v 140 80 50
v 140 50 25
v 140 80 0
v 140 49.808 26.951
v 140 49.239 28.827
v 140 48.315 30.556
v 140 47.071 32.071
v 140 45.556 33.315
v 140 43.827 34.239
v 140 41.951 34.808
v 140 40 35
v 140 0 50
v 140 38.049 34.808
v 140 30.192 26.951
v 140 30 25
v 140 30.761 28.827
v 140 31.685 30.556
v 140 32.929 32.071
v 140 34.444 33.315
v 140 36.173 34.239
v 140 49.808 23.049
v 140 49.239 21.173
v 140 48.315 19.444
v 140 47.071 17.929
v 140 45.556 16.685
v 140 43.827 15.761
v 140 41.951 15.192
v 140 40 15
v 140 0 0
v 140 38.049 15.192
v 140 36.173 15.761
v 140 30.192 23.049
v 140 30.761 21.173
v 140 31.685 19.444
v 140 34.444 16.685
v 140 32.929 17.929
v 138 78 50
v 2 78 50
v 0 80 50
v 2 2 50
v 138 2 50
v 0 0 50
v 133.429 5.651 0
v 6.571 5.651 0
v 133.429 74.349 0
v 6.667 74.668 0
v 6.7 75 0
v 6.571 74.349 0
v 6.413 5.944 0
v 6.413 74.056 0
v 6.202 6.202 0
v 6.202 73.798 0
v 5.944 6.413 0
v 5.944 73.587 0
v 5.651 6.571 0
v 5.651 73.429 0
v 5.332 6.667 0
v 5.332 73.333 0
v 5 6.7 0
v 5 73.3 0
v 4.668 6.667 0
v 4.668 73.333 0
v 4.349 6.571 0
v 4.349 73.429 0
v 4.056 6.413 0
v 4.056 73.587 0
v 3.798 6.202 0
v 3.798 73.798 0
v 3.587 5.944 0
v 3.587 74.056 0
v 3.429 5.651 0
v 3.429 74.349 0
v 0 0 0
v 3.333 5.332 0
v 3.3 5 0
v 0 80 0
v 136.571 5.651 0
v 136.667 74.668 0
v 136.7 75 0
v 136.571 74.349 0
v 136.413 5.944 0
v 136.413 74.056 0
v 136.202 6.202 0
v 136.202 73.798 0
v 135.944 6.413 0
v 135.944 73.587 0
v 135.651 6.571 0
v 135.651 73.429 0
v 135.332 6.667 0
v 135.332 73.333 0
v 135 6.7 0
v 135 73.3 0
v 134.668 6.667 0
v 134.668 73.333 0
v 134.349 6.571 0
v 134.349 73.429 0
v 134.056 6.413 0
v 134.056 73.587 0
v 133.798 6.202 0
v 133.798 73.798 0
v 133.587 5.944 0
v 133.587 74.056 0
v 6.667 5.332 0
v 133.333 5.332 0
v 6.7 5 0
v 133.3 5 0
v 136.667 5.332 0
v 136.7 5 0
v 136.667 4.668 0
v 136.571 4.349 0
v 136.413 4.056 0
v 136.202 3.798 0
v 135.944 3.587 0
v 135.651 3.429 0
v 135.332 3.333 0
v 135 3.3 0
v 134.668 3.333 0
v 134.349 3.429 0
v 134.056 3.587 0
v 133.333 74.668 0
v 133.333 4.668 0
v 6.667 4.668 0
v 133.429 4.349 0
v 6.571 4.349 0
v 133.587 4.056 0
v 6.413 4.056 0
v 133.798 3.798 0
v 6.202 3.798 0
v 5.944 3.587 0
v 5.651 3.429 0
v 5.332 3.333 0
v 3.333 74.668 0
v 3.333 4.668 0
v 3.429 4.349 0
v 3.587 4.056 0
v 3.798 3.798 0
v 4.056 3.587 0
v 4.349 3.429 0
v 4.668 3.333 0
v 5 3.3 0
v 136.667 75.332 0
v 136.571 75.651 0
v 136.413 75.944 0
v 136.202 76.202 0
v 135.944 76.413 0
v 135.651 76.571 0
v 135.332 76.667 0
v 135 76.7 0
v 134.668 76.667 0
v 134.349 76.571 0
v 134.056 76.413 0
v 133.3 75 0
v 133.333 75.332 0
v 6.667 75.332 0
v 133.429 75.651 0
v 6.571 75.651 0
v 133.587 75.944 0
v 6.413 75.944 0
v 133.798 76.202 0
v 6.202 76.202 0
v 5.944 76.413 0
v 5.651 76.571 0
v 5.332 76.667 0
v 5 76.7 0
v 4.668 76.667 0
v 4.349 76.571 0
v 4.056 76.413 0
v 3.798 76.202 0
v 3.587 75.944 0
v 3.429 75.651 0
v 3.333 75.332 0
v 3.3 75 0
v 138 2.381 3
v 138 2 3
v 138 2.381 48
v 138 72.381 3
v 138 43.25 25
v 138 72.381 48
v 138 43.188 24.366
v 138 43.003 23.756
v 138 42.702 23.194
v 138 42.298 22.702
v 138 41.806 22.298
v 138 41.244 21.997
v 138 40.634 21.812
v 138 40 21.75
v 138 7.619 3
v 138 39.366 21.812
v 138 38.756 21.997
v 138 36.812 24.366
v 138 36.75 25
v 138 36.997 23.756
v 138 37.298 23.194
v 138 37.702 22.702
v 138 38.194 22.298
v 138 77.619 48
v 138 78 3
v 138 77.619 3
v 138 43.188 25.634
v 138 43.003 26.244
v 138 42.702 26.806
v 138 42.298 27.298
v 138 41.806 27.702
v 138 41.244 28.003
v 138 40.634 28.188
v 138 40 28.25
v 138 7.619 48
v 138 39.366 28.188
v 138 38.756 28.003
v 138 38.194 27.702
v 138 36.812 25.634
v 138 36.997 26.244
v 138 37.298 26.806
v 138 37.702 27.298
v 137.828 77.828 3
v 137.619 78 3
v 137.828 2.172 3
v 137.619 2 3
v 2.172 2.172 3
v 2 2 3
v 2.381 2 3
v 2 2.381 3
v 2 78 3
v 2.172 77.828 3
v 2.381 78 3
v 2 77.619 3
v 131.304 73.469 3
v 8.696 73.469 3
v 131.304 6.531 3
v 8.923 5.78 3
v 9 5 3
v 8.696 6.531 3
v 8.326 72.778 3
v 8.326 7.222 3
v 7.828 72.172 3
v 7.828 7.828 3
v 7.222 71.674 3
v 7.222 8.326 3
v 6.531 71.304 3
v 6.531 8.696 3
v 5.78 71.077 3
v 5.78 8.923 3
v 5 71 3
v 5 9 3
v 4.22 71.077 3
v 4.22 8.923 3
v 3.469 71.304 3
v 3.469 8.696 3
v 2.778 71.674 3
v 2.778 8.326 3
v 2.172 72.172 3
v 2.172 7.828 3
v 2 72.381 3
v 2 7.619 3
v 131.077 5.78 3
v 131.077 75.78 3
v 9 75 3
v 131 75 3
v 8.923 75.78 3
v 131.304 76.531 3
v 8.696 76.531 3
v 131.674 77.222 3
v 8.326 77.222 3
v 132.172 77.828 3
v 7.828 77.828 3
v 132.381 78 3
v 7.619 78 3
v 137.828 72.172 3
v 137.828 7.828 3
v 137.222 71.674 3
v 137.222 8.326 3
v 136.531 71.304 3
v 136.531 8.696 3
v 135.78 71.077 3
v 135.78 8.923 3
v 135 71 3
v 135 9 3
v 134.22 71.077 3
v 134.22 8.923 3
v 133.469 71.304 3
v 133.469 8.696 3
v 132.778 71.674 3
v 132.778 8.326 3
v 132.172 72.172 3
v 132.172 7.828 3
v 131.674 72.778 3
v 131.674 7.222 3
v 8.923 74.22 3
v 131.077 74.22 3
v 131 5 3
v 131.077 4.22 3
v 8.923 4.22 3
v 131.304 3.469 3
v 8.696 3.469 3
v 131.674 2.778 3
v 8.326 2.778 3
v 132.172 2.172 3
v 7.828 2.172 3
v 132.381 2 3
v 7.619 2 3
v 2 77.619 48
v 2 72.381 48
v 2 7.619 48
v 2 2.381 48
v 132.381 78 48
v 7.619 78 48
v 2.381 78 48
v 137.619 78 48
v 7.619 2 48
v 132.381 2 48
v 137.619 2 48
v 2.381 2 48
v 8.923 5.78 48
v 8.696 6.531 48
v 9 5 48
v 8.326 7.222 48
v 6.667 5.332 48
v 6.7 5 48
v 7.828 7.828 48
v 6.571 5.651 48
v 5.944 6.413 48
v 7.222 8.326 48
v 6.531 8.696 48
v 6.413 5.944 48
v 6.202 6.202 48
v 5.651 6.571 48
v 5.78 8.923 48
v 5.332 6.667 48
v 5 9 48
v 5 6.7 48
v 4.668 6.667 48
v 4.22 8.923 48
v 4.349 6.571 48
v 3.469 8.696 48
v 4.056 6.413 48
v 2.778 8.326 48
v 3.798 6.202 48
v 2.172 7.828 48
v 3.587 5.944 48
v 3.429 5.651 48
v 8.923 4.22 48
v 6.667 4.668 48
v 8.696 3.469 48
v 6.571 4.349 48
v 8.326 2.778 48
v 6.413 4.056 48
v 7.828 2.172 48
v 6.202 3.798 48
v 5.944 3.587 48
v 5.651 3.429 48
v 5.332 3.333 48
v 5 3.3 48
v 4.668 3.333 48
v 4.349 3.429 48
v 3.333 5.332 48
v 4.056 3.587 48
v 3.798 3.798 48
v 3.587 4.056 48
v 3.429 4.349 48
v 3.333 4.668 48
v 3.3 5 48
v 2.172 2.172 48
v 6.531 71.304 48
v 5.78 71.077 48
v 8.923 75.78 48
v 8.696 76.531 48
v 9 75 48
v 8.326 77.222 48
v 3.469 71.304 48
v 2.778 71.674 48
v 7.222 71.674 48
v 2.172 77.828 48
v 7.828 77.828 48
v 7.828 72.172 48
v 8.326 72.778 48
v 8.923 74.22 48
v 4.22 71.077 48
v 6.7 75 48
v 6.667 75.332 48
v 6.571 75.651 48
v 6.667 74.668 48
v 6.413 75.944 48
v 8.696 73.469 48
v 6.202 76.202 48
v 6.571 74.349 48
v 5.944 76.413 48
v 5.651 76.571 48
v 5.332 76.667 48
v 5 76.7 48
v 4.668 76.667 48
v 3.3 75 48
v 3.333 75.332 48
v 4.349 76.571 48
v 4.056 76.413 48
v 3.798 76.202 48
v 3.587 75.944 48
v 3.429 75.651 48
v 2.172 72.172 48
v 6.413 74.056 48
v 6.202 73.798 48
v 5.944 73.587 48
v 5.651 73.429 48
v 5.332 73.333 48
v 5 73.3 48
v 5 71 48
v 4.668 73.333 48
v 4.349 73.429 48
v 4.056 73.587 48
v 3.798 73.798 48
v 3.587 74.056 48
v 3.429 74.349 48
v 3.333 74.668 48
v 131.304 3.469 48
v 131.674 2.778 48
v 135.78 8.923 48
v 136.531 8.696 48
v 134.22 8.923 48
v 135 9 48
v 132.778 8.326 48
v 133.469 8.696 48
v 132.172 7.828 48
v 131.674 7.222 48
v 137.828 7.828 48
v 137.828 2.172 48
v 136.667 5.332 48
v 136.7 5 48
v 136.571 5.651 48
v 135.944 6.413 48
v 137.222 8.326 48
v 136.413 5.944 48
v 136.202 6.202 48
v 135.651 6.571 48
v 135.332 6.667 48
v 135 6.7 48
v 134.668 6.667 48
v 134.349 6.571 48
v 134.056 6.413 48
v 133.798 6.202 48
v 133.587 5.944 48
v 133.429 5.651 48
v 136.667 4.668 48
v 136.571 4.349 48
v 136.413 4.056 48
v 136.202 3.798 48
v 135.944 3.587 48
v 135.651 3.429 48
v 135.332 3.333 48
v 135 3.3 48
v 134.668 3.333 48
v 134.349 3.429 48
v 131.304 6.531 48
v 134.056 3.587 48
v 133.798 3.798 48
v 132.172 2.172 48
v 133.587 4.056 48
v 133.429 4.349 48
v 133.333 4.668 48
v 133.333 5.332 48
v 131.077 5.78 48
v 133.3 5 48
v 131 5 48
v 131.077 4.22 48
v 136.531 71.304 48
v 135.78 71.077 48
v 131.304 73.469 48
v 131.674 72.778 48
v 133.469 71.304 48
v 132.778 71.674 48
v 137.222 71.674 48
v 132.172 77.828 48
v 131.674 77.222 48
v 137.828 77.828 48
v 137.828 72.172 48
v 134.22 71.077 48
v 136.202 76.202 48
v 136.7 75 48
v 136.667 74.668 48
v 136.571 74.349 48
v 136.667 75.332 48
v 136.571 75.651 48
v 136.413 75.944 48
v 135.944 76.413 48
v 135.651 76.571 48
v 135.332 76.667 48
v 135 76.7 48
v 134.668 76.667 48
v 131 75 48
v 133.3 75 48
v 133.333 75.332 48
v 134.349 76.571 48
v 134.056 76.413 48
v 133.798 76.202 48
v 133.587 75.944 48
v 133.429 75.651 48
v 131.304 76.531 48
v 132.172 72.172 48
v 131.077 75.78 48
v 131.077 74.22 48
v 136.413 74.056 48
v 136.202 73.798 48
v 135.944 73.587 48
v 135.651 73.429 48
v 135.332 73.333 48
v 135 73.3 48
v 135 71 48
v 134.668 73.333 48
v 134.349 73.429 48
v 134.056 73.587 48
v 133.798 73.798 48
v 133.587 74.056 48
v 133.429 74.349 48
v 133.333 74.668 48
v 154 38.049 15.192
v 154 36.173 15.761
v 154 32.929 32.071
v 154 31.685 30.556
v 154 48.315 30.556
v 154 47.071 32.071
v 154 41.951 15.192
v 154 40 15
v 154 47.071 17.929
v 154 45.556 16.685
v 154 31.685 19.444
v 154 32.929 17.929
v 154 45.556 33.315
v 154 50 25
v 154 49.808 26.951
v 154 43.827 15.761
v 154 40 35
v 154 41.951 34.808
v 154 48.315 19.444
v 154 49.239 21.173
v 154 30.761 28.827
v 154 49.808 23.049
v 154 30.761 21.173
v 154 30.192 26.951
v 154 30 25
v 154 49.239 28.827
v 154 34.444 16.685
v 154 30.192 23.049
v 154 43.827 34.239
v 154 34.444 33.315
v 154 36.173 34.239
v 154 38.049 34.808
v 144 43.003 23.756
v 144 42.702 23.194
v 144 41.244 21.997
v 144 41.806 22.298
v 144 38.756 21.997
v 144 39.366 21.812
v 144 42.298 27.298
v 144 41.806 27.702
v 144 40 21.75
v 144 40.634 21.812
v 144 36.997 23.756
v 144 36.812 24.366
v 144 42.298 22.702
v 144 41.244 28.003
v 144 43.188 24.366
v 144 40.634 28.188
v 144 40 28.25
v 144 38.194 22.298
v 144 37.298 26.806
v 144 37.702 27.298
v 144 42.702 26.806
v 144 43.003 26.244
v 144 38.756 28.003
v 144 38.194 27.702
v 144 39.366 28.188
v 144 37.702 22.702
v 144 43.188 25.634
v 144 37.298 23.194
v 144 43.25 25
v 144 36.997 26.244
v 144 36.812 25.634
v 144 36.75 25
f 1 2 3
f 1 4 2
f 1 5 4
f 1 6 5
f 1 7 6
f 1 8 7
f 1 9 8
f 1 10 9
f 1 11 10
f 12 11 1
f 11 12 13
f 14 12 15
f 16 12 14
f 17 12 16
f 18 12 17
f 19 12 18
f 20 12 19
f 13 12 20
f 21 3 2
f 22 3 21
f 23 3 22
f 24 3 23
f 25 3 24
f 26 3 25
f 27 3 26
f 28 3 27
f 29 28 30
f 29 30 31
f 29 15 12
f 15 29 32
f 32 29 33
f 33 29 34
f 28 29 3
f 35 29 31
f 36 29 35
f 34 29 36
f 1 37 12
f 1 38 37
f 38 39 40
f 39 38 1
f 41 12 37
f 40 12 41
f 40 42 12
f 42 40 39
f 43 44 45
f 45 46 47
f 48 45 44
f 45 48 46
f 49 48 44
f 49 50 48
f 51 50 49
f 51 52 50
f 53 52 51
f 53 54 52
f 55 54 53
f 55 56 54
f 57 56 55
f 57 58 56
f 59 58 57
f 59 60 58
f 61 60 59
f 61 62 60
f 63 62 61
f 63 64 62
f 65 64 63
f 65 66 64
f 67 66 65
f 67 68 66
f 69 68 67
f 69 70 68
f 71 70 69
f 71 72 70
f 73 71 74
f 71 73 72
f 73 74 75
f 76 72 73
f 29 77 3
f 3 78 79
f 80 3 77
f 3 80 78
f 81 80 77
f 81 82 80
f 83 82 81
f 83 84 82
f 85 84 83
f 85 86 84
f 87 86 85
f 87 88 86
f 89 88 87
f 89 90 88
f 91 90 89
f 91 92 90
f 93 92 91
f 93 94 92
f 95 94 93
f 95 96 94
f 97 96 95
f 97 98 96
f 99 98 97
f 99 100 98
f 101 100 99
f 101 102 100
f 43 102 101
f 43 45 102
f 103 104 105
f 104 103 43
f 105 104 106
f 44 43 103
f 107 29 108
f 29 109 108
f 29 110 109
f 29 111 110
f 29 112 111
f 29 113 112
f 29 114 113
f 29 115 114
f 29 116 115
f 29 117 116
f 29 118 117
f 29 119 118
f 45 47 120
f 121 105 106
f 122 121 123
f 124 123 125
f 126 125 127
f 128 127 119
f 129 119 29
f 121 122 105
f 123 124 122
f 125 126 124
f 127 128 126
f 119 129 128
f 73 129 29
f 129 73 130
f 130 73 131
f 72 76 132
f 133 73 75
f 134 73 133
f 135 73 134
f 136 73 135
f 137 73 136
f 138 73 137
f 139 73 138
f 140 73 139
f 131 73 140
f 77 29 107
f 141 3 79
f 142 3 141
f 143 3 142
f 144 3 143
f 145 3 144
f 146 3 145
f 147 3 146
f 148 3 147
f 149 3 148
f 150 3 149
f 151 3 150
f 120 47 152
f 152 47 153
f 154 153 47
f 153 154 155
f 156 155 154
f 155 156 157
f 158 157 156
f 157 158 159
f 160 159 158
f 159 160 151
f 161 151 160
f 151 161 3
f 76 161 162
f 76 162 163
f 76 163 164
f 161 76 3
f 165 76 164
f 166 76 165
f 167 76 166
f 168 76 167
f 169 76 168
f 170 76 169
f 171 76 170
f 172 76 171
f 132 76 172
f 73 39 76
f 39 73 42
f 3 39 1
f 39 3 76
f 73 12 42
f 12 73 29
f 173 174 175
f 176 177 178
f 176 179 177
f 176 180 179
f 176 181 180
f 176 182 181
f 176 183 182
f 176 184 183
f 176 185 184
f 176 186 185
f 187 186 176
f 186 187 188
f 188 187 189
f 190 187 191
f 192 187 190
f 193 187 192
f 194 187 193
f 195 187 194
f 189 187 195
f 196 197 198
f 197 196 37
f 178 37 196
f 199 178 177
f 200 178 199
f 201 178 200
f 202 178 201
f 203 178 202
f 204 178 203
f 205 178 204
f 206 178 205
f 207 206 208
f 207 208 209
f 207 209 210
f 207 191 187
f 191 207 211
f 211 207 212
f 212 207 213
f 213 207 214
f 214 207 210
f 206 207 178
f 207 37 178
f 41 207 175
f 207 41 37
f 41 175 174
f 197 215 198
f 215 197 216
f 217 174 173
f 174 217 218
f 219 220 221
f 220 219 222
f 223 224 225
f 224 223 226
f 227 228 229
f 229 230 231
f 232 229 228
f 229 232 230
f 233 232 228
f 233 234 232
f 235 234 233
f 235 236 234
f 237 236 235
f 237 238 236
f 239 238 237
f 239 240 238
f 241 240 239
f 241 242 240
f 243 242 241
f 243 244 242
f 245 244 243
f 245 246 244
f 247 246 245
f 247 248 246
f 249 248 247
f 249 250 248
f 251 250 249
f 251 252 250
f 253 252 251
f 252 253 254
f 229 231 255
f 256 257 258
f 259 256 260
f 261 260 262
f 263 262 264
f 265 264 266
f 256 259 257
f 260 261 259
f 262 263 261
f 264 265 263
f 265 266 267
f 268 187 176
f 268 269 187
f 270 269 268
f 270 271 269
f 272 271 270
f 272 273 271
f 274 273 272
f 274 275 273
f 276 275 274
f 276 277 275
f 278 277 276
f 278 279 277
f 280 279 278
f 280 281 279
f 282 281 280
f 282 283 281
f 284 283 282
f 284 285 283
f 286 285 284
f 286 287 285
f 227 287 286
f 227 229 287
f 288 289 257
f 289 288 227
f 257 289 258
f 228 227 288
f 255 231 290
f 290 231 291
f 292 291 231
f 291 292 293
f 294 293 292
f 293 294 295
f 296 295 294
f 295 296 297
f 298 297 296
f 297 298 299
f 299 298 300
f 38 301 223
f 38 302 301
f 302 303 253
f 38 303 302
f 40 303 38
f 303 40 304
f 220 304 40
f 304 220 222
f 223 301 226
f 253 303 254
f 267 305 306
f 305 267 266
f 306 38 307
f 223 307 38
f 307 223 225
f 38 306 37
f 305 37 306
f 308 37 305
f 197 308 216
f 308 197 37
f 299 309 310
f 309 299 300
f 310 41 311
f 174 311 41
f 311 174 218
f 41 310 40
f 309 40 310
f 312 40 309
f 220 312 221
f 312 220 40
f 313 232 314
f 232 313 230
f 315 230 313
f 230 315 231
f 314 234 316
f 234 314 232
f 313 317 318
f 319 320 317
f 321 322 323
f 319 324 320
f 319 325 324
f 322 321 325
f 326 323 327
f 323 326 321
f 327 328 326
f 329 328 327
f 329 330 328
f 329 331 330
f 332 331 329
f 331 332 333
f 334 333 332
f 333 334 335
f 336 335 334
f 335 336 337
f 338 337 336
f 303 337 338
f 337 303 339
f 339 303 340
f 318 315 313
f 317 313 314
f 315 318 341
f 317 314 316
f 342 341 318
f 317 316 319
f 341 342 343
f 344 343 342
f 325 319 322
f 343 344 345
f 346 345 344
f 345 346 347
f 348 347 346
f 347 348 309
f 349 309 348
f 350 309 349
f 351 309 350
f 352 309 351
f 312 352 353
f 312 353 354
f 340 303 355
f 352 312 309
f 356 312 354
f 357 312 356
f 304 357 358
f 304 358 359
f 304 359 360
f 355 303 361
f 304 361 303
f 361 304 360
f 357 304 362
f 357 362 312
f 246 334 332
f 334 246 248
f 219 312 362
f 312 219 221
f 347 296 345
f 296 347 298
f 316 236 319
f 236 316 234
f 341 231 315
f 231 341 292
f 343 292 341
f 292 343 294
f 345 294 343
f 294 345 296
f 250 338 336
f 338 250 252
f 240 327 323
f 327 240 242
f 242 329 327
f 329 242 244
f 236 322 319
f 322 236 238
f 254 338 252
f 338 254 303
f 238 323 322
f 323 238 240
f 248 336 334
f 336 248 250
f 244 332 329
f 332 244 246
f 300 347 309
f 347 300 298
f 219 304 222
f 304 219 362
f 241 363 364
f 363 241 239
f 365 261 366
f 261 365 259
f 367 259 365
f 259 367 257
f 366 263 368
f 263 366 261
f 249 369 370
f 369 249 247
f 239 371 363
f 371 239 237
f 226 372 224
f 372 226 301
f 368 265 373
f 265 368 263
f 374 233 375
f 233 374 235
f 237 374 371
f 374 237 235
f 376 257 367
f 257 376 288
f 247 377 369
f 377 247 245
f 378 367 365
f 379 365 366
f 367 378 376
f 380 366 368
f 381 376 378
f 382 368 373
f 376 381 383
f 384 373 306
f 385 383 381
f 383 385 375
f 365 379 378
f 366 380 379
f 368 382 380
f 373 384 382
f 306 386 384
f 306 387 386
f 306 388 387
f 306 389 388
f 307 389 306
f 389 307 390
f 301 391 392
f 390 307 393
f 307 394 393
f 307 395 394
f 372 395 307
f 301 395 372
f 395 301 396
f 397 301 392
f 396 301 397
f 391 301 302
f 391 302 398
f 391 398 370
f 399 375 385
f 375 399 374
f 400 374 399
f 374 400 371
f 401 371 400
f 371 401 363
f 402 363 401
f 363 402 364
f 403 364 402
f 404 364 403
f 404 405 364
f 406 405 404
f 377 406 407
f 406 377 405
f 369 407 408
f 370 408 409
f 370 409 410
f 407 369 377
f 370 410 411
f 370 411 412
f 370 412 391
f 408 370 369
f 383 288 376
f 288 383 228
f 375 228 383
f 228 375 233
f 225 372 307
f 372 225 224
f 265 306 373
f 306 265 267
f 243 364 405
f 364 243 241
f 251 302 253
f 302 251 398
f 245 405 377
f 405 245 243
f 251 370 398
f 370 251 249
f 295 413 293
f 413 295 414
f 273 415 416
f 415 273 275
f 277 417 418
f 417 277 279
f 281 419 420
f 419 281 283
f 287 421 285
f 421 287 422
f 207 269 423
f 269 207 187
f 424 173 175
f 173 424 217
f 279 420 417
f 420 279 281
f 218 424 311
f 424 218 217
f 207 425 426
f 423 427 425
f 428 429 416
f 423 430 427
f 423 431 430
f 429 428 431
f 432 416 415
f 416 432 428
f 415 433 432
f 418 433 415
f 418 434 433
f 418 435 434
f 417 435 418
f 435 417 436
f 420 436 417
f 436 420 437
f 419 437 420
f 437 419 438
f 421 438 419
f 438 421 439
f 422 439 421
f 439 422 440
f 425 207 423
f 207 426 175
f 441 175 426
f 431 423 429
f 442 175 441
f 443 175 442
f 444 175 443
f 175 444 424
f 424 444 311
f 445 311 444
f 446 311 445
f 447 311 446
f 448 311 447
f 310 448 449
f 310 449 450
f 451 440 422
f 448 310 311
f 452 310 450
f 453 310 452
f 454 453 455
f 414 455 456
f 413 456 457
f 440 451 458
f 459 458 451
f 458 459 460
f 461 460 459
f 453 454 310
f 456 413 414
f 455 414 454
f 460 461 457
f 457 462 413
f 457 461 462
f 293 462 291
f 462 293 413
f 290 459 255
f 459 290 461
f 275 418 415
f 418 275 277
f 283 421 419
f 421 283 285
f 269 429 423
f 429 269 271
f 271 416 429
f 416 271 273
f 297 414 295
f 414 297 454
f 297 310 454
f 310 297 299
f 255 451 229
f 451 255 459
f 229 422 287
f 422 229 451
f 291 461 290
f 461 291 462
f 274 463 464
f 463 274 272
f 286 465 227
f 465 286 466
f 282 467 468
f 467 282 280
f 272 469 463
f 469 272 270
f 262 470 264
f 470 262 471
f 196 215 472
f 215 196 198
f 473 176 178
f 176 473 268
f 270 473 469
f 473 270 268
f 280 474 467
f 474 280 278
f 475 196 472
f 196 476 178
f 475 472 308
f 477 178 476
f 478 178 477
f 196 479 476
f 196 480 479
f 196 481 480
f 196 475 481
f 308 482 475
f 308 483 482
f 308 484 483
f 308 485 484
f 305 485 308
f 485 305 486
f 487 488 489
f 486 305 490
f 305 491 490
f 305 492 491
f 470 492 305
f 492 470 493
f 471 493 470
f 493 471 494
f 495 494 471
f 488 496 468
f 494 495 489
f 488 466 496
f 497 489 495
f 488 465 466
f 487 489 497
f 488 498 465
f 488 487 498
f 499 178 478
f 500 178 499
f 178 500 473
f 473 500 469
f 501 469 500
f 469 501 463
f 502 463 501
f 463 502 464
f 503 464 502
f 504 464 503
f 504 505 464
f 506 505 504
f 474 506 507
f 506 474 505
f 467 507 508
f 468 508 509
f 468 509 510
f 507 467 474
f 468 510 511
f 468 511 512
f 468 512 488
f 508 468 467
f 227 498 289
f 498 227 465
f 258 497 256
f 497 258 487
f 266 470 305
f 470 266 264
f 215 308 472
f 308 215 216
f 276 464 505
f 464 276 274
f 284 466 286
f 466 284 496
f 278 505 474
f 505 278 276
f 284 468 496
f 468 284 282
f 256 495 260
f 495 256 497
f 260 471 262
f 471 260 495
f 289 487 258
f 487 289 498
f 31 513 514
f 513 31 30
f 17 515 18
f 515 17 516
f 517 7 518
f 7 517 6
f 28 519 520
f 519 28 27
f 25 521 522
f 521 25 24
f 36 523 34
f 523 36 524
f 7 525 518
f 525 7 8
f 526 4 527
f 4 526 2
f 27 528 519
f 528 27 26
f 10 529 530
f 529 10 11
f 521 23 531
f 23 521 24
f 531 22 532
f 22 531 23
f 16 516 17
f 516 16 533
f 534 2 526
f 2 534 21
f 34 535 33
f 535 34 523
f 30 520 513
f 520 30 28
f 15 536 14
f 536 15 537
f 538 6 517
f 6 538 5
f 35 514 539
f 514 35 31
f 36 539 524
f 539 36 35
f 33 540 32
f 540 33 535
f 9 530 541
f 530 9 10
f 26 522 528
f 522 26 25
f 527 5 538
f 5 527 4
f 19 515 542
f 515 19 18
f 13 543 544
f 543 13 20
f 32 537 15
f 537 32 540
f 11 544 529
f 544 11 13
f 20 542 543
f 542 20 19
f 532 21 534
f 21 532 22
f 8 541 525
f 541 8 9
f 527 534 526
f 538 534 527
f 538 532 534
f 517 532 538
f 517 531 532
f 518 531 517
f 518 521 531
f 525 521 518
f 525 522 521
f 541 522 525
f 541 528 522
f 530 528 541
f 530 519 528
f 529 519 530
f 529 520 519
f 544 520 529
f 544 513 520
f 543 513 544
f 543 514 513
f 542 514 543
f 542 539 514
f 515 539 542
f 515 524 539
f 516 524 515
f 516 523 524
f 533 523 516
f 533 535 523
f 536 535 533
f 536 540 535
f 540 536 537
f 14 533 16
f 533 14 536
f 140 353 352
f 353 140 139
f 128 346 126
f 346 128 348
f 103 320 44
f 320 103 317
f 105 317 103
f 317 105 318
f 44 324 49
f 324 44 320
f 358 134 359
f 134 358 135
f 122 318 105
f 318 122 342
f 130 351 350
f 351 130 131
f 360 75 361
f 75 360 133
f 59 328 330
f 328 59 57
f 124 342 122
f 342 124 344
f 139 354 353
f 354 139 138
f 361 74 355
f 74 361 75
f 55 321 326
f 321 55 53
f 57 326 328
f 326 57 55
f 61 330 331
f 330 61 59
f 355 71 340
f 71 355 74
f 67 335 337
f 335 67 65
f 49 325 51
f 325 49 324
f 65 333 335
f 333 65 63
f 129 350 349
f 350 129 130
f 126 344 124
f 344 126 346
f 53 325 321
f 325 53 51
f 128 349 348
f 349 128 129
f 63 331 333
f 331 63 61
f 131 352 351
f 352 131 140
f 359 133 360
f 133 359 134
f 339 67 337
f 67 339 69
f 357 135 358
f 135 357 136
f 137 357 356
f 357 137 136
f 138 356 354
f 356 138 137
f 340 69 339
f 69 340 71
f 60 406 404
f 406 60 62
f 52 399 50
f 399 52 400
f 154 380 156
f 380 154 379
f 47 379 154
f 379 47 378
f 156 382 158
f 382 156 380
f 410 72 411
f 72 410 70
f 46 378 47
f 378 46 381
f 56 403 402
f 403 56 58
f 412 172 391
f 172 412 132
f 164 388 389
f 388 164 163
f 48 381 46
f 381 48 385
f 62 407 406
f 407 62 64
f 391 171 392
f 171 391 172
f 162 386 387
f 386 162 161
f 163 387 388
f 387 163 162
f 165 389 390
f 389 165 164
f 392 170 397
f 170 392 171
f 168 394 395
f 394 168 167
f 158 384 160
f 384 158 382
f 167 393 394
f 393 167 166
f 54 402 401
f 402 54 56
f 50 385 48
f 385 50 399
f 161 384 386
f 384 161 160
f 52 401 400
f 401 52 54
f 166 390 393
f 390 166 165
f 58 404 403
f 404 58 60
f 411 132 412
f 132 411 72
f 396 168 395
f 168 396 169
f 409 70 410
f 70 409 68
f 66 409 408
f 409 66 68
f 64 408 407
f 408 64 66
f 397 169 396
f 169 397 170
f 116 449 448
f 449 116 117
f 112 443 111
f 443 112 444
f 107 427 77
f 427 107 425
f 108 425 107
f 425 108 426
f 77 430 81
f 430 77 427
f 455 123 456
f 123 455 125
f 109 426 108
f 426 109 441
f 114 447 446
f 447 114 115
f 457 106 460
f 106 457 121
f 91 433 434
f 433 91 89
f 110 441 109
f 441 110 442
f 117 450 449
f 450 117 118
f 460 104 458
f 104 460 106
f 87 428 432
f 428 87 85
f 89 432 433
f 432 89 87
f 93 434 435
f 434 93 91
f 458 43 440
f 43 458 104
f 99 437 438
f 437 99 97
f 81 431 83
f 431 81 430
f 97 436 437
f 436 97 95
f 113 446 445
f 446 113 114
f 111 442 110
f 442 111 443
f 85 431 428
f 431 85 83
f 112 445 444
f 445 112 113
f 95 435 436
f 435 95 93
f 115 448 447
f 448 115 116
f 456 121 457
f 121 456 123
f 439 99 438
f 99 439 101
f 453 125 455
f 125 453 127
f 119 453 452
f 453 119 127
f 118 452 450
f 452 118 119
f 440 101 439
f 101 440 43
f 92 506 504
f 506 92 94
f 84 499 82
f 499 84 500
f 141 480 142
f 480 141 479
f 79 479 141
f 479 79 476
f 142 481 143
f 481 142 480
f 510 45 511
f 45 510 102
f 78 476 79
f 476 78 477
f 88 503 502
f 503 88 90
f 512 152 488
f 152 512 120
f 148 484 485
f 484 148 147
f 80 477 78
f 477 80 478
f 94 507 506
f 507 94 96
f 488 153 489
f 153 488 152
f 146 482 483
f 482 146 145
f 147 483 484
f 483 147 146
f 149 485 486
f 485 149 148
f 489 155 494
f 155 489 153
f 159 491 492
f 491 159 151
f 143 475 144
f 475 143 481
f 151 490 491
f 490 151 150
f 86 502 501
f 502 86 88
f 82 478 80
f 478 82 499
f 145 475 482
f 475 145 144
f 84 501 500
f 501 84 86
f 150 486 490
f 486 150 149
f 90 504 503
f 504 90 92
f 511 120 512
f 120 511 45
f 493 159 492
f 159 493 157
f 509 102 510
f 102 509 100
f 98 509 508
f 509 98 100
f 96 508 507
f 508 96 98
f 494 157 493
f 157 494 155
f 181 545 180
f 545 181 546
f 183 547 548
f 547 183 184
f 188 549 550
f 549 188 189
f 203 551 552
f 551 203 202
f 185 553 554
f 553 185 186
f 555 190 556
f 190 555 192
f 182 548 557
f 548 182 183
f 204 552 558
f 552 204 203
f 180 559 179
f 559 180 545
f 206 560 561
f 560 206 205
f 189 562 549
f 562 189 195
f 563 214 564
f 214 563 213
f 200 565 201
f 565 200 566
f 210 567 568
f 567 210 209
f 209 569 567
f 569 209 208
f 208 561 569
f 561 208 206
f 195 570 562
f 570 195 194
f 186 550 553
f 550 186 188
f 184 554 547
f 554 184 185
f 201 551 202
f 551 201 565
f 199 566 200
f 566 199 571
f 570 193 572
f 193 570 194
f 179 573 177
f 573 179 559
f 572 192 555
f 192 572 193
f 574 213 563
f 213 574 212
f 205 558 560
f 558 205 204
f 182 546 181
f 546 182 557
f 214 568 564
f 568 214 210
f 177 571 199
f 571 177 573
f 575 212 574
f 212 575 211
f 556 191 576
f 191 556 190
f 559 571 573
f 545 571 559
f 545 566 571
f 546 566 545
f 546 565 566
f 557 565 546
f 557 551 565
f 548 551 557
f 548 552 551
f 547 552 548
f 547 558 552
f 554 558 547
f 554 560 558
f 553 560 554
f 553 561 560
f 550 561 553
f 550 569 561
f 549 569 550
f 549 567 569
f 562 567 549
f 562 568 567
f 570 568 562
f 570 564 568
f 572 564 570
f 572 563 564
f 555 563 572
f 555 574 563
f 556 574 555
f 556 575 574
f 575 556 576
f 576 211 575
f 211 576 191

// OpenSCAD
$fn = 32;

// ----------------------------------------------------------------------
// Enclosure body: 140 x 80 x 50 mm, wall 2 mm
// ----------------------------------------------------------------------

// --- parameters (mm) ---
length = 140;             // outside length, X
width = 80;               // outside width, Y
height = 50;              // outside height, Z
wall = 2;                 // side wall thickness
floor_t = 3;              // floor thickness
boss_d = 8;               // corner boss diameter
boss_h = 45;              // corner boss height above the floor
boss_hole_d = 3.4;        // lid screw clearance in the boss
boss_lip = 5;             // boss centre inset from the corner
nipple_d = 20;            // cable gland boss diameter
nipple_h = 14;            // cable gland boss height
nipple_bore = 6.5;        // cable gland bore

module shell() {
  difference() {
    cube([length, width, height]);
    /* hollow, open at the top */
    translate([wall, wall, floor_t])
      cube([length - 2 * wall, width - 2 * wall, height]);
  }
}

module bosses() {
  /* corner bosses, sunk 1 mm into the floor */
  for (sx = [0, 1]) for (sy = [0, 1])
    translate([sx * (length - 2 * boss_lip) + boss_lip, sy * (width - 2 * boss_lip) + boss_lip, floor_t - 1])
      cylinder(h = boss_h + 1, d = boss_d);
}

module gland() {
  /* boss on the short wall, sunk 1 mm into it */
  translate([length - 1, width / 2, height * 0.5]) rotate([0, 90, 0])
    cylinder(h = nipple_h + 1, d = nipple_d);
}

difference() {
  union() {
    shell();
    bosses();
    gland();
  }
  /* boss screw holes */
  for (sx = [0, 1]) for (sy = [0, 1])
    translate([sx * (length - 2 * boss_lip) + boss_lip, sy * (width - 2 * boss_lip) + boss_lip, -1]) cylinder(h = floor_t + boss_h + 2, d = boss_hole_d);
  translate([length, width / 2, height * 0.5]) rotate([0, 90, 0]) translate([0, 0, -nipple_h - 2]) cylinder(h = nipple_h + wall + 4, d = nipple_bore);
}
